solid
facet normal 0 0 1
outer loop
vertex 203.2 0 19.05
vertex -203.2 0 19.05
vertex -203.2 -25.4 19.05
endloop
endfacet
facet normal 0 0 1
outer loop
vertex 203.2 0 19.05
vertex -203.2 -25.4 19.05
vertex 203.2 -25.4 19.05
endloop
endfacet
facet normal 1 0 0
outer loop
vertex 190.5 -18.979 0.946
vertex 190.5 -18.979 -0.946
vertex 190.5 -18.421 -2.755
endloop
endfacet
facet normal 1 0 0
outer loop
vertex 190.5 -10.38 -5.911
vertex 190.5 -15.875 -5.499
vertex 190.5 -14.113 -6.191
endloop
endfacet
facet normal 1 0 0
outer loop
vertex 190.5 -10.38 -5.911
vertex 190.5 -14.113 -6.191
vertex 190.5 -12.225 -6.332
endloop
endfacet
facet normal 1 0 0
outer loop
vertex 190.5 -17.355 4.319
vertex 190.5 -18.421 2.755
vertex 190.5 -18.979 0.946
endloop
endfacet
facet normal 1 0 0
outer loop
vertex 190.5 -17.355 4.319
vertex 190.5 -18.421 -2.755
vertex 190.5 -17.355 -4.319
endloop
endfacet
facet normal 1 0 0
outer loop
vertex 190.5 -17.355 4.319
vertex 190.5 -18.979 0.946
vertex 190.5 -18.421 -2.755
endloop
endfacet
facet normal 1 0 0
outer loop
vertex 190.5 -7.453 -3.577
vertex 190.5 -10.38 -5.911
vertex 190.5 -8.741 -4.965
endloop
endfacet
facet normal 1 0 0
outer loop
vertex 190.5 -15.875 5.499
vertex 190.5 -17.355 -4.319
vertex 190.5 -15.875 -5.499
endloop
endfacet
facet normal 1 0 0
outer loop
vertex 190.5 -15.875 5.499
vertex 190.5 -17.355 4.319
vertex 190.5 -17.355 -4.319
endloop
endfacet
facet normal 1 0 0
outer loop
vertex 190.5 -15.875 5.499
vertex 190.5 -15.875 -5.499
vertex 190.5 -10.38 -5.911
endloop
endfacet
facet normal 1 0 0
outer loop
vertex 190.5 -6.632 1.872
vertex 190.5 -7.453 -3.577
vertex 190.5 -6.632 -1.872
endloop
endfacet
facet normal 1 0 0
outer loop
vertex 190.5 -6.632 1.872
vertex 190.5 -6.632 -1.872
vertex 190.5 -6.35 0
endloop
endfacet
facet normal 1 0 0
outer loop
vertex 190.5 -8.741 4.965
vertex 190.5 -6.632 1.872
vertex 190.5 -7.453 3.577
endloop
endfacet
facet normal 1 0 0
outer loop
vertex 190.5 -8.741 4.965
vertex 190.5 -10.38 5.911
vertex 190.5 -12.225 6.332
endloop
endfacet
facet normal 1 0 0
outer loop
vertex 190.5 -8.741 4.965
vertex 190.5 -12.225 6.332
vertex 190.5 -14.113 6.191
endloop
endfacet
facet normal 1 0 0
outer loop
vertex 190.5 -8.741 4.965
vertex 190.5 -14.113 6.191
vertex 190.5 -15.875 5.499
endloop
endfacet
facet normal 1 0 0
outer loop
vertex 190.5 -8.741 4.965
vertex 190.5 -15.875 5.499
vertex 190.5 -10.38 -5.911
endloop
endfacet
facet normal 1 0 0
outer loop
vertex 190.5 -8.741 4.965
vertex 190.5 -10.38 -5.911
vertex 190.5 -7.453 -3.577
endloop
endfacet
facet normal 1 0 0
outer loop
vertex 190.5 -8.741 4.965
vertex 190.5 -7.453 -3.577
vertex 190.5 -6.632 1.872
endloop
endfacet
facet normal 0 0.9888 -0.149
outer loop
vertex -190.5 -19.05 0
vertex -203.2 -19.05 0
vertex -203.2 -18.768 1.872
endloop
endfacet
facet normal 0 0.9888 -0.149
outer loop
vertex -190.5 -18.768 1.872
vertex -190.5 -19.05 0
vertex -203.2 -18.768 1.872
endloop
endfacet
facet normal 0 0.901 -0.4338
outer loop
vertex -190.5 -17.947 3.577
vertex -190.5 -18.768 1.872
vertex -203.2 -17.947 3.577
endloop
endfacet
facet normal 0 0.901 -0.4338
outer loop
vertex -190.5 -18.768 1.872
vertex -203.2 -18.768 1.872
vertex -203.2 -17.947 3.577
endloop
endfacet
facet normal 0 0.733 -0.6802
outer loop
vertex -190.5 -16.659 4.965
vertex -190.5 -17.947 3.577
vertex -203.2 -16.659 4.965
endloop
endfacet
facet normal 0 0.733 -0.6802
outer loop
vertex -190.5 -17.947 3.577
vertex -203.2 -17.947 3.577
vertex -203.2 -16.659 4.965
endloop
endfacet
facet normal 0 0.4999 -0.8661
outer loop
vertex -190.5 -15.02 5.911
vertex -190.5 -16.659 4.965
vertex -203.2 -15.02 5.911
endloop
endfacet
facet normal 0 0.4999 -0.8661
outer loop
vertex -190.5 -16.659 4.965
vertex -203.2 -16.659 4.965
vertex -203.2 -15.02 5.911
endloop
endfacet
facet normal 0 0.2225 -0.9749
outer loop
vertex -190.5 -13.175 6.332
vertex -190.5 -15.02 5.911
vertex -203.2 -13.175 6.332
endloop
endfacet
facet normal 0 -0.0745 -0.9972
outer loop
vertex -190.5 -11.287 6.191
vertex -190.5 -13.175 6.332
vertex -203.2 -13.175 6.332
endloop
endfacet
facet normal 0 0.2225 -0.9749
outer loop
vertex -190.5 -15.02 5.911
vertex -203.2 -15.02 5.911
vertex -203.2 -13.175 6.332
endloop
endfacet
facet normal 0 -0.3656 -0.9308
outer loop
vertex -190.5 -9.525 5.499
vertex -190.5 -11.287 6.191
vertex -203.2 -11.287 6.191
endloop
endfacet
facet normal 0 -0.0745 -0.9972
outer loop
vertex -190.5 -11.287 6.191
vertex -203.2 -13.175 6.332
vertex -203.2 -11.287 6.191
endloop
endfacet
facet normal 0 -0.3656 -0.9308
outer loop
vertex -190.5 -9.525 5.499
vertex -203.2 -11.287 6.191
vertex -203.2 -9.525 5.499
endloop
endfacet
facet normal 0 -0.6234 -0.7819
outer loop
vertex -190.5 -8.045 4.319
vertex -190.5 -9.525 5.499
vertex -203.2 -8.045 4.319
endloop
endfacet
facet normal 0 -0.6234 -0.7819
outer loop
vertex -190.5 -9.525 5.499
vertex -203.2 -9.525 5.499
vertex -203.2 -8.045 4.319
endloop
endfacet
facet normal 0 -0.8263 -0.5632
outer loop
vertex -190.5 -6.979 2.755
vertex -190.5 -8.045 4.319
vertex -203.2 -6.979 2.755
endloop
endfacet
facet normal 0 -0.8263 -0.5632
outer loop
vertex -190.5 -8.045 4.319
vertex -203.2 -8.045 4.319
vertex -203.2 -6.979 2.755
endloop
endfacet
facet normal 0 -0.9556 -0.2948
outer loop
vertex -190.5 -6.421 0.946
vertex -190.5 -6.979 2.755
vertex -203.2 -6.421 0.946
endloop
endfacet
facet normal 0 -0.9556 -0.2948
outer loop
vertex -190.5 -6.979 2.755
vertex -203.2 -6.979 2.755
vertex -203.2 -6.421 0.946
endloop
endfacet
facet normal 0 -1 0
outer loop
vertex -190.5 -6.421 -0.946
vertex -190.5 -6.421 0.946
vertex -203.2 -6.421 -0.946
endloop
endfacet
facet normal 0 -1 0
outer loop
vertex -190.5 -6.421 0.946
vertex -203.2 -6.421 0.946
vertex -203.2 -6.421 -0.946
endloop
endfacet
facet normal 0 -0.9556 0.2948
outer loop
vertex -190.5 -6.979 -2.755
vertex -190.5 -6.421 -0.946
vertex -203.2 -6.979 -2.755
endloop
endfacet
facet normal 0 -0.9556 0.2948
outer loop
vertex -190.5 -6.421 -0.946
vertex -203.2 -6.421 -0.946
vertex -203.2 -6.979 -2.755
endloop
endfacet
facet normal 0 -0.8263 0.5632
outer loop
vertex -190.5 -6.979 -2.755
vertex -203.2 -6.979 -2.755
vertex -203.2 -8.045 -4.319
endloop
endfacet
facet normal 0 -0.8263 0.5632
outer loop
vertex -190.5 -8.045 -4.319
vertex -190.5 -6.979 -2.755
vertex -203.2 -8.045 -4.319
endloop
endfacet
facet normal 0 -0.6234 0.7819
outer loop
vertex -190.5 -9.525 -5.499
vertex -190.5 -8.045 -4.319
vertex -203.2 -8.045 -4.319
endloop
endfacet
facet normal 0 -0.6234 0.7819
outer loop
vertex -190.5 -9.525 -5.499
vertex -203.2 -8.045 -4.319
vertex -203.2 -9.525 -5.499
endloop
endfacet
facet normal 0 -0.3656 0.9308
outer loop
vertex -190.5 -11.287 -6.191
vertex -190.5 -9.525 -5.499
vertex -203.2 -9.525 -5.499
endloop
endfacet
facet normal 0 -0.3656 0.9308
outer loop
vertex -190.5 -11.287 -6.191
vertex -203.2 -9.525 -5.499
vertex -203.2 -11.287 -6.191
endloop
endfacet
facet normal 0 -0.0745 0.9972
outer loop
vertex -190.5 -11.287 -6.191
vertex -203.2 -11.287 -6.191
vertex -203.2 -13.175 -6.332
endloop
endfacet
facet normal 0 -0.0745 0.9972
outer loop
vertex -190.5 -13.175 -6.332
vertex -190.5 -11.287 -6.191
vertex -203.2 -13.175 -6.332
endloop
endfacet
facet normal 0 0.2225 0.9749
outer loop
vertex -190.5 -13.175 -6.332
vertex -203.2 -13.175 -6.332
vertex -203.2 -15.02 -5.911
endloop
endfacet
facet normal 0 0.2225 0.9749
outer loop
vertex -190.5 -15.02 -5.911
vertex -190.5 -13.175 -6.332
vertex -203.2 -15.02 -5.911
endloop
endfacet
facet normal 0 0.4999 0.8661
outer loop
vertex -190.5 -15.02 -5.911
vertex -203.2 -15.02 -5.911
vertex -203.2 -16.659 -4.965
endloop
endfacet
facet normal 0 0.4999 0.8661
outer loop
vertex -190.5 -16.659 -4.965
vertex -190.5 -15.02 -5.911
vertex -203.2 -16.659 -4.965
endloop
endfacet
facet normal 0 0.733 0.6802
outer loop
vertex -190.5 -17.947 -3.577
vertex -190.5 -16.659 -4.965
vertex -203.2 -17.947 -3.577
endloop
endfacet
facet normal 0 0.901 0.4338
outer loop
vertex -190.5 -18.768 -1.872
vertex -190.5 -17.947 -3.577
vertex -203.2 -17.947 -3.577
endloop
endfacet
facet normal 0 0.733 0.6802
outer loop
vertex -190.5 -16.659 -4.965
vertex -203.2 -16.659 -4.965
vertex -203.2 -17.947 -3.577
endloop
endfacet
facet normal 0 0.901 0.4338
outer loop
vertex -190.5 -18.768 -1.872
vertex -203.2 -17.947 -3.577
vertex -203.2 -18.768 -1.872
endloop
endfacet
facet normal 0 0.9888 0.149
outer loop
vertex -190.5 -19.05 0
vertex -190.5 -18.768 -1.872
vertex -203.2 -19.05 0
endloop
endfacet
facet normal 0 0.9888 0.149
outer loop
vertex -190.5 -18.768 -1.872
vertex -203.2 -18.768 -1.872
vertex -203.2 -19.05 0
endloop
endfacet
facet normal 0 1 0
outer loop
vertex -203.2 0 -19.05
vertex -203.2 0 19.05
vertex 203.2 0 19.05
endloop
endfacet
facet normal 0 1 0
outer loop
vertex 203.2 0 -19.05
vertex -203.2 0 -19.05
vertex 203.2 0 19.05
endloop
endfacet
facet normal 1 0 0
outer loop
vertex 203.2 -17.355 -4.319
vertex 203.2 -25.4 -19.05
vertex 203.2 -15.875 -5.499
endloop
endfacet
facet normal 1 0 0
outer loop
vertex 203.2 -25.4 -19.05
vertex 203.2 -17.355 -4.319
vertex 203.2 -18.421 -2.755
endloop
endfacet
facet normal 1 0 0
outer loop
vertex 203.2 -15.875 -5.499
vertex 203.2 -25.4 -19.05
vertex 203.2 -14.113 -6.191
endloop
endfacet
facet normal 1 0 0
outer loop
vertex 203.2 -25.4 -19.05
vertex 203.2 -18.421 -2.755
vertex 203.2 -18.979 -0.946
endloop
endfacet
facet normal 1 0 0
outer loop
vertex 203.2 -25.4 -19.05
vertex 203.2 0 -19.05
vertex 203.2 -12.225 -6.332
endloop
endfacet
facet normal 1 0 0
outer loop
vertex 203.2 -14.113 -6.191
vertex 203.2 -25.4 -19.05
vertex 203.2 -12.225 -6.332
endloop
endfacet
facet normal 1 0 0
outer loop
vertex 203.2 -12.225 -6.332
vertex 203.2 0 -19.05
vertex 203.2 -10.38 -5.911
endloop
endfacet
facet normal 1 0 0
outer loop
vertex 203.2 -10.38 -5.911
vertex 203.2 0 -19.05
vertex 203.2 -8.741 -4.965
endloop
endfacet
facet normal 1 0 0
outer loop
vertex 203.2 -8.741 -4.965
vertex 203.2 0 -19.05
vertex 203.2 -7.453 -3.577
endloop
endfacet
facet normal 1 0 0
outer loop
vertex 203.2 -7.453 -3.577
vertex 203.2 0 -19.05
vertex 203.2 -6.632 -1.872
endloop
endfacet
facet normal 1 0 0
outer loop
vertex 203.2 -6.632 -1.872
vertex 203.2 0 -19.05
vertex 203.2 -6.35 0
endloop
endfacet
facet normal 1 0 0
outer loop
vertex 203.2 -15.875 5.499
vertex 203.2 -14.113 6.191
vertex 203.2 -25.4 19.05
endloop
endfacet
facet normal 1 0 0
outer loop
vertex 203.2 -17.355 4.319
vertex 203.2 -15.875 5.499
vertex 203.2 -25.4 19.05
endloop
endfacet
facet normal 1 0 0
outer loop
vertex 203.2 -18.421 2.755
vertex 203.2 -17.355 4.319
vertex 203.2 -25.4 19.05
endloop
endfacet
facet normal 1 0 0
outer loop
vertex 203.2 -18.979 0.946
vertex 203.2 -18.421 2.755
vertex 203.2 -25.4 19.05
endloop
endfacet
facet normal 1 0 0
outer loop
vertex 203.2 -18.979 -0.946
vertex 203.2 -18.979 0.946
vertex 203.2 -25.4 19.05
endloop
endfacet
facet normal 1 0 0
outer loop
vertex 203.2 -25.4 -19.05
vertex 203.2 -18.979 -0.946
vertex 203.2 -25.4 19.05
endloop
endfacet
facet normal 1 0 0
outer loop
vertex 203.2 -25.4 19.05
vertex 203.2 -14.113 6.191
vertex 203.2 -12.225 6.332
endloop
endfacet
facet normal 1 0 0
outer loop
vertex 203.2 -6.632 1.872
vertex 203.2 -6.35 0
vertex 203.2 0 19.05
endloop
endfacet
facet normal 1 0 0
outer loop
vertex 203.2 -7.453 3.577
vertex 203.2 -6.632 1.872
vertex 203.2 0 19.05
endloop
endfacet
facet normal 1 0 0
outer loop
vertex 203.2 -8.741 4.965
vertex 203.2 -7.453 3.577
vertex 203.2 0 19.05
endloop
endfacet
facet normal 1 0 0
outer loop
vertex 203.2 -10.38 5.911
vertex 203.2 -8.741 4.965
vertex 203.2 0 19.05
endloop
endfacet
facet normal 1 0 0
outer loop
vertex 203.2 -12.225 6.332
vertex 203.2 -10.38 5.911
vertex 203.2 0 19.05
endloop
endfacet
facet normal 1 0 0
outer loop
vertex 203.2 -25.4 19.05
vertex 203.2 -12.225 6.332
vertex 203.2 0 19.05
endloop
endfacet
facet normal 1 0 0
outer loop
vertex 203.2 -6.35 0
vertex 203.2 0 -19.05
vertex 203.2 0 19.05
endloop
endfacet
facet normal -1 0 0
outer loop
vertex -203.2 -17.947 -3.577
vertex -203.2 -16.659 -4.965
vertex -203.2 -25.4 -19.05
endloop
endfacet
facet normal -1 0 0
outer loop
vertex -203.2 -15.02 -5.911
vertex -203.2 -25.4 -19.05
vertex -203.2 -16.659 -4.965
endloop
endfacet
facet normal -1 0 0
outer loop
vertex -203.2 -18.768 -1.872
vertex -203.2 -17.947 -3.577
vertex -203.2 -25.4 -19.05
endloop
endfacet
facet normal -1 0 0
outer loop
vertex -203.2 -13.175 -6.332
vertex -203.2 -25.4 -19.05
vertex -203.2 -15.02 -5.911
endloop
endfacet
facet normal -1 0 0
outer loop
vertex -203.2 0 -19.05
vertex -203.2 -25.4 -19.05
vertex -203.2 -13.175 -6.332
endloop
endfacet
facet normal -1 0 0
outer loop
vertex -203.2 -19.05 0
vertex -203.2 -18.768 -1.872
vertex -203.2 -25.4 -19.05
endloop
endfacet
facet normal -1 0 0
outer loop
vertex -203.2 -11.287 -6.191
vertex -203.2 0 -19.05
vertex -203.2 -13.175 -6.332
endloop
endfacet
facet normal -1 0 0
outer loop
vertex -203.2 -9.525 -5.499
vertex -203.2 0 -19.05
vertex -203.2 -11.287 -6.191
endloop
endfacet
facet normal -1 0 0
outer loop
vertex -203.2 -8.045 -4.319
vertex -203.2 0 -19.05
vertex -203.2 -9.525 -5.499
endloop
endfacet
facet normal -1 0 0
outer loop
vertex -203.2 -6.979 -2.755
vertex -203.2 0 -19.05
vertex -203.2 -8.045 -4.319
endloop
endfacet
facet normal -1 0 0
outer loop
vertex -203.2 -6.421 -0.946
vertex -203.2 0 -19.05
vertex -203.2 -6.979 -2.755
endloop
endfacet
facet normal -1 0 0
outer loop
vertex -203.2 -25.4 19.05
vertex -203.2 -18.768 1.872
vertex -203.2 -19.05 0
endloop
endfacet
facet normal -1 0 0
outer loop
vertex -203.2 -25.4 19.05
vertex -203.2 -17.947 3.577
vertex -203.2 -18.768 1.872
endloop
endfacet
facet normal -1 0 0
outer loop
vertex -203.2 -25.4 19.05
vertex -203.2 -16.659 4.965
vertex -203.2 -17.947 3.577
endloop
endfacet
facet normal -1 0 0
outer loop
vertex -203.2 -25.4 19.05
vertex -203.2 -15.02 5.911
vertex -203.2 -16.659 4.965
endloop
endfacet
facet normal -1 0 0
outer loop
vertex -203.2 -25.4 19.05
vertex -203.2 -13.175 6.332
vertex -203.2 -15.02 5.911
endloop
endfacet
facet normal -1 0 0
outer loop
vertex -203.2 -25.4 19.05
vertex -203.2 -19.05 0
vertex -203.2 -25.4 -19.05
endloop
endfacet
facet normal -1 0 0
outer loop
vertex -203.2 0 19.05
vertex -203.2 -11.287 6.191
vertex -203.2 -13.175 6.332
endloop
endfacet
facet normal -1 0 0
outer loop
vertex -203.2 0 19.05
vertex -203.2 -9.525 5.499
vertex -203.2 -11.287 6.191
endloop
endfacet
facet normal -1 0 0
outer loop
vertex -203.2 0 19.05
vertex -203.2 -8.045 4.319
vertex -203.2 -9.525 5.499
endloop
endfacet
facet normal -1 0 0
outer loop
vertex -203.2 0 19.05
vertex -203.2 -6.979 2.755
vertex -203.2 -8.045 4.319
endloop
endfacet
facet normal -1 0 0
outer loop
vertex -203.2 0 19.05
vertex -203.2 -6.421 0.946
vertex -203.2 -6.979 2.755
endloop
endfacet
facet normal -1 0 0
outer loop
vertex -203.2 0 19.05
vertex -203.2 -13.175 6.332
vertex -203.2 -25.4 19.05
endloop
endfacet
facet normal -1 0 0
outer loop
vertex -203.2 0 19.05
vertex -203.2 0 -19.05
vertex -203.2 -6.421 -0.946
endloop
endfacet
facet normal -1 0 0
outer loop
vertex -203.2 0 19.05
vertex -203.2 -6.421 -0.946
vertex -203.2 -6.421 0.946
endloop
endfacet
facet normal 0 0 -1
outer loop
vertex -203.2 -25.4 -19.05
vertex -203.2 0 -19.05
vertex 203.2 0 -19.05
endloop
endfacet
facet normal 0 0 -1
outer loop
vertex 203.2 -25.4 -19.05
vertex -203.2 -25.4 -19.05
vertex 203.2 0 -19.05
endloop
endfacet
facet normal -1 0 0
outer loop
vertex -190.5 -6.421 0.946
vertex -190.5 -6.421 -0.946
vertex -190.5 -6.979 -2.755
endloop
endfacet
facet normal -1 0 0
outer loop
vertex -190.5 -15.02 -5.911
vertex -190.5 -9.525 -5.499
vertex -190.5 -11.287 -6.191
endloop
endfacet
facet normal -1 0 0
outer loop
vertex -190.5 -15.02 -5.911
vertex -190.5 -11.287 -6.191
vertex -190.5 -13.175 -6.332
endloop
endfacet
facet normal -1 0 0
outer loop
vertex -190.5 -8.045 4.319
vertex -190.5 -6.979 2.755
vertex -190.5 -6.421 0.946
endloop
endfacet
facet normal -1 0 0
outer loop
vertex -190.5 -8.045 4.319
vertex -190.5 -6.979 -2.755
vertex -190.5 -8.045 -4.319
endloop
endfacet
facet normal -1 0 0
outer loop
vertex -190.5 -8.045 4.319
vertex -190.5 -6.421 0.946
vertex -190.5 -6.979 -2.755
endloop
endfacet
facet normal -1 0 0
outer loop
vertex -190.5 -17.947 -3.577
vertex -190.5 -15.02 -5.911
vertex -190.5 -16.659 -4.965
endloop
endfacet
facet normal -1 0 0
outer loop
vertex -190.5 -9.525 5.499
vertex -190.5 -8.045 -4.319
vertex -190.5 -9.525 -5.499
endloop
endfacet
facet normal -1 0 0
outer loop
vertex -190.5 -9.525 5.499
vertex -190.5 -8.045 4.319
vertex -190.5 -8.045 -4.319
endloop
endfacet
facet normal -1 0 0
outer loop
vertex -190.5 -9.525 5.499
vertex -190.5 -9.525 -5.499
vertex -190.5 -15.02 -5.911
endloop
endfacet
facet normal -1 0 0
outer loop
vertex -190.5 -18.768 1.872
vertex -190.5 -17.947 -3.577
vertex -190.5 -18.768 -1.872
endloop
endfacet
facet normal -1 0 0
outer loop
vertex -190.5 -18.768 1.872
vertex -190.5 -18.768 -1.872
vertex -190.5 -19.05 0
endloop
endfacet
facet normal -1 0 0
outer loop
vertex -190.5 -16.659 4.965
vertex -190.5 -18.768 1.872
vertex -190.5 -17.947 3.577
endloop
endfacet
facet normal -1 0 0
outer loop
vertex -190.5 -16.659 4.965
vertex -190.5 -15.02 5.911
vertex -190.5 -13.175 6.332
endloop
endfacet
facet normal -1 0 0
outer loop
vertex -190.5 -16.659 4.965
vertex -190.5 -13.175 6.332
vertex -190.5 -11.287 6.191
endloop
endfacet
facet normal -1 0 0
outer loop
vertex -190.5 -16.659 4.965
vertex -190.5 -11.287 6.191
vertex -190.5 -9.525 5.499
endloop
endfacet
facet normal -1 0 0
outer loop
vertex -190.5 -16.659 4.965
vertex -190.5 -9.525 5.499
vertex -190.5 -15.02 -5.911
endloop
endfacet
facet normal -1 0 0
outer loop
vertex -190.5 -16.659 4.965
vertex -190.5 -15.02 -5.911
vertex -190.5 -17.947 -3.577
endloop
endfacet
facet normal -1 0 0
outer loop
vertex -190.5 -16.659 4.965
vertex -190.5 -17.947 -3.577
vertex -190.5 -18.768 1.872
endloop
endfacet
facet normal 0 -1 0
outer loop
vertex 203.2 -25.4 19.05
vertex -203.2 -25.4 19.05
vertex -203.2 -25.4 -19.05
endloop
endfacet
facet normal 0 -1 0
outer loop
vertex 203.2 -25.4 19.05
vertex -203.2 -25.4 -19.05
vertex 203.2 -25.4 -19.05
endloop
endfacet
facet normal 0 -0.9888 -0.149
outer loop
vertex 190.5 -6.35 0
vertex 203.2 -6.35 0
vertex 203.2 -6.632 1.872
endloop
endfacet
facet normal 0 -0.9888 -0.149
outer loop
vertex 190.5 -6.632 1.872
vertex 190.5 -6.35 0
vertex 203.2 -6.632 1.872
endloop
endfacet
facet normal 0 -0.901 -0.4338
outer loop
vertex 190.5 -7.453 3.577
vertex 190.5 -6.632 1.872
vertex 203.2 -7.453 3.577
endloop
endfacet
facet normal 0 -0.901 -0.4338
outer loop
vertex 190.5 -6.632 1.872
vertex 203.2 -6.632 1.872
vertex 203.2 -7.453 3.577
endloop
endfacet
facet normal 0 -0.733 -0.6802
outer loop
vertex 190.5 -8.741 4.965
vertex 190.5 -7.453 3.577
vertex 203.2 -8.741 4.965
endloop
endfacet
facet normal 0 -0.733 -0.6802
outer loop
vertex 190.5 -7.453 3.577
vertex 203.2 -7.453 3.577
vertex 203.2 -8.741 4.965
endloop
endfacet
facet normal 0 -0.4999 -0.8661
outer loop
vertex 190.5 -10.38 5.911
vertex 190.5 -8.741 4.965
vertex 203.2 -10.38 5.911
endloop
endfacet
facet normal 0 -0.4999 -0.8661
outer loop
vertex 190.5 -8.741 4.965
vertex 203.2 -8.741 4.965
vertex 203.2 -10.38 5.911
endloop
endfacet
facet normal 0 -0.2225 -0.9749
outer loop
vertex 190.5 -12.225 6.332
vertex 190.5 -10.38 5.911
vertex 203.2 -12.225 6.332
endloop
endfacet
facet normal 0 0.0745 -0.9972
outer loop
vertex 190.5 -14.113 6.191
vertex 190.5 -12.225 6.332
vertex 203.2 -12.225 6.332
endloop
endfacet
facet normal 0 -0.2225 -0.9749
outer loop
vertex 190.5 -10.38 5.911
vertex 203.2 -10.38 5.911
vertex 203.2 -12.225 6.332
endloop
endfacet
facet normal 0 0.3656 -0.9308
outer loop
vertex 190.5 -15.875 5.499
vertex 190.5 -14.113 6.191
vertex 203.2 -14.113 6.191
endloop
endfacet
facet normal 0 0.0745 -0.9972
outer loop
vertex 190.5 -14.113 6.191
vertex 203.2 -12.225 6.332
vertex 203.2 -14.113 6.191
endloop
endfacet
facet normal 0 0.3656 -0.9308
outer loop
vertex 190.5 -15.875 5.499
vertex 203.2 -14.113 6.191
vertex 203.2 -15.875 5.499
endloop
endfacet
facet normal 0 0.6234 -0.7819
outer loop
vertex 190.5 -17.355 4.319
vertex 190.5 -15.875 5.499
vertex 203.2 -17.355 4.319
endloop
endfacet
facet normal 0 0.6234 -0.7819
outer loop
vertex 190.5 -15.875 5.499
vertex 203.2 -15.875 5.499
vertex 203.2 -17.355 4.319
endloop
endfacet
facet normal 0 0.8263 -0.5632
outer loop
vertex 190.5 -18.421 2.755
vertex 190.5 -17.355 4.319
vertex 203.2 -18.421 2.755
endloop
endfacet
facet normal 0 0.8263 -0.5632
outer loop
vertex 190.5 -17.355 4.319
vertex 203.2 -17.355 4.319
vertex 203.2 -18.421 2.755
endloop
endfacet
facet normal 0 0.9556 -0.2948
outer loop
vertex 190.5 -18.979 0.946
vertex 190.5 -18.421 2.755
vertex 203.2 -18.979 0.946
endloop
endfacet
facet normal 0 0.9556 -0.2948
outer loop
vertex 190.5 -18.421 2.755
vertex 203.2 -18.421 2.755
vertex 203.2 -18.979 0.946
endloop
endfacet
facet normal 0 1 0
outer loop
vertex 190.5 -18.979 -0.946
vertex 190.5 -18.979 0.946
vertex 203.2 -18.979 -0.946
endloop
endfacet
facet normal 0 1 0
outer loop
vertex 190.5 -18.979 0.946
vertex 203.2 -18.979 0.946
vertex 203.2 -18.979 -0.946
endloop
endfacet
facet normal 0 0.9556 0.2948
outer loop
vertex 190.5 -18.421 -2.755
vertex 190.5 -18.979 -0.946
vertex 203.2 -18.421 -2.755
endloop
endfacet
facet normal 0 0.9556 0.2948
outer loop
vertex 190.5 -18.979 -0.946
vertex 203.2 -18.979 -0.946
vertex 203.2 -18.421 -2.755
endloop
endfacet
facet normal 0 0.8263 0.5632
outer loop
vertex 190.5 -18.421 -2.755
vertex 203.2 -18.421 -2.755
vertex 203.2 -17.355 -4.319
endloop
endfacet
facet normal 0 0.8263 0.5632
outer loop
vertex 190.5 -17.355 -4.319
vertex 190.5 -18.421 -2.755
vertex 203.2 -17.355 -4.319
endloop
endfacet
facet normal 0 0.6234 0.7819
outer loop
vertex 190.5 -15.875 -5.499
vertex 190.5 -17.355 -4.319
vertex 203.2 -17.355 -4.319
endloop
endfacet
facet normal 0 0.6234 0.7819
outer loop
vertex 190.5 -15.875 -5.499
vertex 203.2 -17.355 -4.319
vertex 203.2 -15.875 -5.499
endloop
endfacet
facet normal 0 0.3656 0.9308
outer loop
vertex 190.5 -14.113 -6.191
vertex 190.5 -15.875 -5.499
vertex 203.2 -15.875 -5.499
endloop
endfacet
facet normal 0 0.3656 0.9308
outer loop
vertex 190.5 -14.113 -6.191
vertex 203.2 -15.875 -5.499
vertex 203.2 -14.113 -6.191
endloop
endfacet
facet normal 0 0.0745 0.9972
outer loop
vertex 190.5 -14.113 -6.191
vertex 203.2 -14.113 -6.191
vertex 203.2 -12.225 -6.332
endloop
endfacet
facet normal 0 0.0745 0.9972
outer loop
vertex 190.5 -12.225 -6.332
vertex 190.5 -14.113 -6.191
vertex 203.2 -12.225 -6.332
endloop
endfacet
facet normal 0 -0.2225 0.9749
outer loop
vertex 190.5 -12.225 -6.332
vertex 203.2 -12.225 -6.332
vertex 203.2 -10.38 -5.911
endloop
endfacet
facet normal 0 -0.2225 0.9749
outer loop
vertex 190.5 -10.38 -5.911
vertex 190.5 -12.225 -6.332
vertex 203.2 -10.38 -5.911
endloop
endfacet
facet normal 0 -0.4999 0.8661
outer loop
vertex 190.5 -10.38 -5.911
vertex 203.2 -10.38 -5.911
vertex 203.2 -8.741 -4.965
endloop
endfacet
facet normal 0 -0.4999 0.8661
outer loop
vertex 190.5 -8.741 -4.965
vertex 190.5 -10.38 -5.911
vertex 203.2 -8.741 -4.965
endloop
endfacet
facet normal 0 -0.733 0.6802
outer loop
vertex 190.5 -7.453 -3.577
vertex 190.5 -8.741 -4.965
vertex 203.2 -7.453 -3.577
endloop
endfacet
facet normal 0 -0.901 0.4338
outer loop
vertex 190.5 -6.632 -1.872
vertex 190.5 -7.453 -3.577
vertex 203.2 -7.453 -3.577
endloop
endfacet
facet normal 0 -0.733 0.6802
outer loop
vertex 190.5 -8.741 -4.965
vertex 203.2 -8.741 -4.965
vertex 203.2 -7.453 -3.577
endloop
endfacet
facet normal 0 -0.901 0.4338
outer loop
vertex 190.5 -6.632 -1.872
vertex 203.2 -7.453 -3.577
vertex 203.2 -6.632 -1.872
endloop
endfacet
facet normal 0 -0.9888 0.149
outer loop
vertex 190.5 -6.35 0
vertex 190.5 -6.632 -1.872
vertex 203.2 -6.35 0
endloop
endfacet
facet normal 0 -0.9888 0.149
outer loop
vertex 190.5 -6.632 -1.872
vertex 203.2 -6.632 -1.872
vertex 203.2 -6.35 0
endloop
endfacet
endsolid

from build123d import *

# Parameters (mm, degrees)
F0_W     = 406.4
F0_H     = 38.1
F1_DEPTH = 25.4
F2_R     = 6.35
F3_DEPTH = 12.7
F4_R     = 6.35
F5_DEPTH = 12.7


with BuildPart() as f1:
    # F0 (on Front) → F1 (new body)
    with BuildSketch(Plane.XZ):
        Rectangle(F0_W, F0_H)
    extrude(amount=F1_DEPTH)

    # F2 (on face) → F3 (cut)
    with BuildSketch(Plane(origin=(-203.2, 0, 0), x_dir=(0, -1, 0), z_dir=(-1, 0, 0))):
        with Locations((12.7, 0)):
            Circle(F2_R)
    extrude(amount=-F3_DEPTH, mode=Mode.SUBTRACT)

    # F4 (on face) → F5 (cut)
    with BuildSketch(Plane.YZ.offset(203.2)):
        with Locations((-12.7, 0)):
            Circle(F4_R)
    extrude(amount=-F5_DEPTH, mode=Mode.SUBTRACT)


solid = f1.part
